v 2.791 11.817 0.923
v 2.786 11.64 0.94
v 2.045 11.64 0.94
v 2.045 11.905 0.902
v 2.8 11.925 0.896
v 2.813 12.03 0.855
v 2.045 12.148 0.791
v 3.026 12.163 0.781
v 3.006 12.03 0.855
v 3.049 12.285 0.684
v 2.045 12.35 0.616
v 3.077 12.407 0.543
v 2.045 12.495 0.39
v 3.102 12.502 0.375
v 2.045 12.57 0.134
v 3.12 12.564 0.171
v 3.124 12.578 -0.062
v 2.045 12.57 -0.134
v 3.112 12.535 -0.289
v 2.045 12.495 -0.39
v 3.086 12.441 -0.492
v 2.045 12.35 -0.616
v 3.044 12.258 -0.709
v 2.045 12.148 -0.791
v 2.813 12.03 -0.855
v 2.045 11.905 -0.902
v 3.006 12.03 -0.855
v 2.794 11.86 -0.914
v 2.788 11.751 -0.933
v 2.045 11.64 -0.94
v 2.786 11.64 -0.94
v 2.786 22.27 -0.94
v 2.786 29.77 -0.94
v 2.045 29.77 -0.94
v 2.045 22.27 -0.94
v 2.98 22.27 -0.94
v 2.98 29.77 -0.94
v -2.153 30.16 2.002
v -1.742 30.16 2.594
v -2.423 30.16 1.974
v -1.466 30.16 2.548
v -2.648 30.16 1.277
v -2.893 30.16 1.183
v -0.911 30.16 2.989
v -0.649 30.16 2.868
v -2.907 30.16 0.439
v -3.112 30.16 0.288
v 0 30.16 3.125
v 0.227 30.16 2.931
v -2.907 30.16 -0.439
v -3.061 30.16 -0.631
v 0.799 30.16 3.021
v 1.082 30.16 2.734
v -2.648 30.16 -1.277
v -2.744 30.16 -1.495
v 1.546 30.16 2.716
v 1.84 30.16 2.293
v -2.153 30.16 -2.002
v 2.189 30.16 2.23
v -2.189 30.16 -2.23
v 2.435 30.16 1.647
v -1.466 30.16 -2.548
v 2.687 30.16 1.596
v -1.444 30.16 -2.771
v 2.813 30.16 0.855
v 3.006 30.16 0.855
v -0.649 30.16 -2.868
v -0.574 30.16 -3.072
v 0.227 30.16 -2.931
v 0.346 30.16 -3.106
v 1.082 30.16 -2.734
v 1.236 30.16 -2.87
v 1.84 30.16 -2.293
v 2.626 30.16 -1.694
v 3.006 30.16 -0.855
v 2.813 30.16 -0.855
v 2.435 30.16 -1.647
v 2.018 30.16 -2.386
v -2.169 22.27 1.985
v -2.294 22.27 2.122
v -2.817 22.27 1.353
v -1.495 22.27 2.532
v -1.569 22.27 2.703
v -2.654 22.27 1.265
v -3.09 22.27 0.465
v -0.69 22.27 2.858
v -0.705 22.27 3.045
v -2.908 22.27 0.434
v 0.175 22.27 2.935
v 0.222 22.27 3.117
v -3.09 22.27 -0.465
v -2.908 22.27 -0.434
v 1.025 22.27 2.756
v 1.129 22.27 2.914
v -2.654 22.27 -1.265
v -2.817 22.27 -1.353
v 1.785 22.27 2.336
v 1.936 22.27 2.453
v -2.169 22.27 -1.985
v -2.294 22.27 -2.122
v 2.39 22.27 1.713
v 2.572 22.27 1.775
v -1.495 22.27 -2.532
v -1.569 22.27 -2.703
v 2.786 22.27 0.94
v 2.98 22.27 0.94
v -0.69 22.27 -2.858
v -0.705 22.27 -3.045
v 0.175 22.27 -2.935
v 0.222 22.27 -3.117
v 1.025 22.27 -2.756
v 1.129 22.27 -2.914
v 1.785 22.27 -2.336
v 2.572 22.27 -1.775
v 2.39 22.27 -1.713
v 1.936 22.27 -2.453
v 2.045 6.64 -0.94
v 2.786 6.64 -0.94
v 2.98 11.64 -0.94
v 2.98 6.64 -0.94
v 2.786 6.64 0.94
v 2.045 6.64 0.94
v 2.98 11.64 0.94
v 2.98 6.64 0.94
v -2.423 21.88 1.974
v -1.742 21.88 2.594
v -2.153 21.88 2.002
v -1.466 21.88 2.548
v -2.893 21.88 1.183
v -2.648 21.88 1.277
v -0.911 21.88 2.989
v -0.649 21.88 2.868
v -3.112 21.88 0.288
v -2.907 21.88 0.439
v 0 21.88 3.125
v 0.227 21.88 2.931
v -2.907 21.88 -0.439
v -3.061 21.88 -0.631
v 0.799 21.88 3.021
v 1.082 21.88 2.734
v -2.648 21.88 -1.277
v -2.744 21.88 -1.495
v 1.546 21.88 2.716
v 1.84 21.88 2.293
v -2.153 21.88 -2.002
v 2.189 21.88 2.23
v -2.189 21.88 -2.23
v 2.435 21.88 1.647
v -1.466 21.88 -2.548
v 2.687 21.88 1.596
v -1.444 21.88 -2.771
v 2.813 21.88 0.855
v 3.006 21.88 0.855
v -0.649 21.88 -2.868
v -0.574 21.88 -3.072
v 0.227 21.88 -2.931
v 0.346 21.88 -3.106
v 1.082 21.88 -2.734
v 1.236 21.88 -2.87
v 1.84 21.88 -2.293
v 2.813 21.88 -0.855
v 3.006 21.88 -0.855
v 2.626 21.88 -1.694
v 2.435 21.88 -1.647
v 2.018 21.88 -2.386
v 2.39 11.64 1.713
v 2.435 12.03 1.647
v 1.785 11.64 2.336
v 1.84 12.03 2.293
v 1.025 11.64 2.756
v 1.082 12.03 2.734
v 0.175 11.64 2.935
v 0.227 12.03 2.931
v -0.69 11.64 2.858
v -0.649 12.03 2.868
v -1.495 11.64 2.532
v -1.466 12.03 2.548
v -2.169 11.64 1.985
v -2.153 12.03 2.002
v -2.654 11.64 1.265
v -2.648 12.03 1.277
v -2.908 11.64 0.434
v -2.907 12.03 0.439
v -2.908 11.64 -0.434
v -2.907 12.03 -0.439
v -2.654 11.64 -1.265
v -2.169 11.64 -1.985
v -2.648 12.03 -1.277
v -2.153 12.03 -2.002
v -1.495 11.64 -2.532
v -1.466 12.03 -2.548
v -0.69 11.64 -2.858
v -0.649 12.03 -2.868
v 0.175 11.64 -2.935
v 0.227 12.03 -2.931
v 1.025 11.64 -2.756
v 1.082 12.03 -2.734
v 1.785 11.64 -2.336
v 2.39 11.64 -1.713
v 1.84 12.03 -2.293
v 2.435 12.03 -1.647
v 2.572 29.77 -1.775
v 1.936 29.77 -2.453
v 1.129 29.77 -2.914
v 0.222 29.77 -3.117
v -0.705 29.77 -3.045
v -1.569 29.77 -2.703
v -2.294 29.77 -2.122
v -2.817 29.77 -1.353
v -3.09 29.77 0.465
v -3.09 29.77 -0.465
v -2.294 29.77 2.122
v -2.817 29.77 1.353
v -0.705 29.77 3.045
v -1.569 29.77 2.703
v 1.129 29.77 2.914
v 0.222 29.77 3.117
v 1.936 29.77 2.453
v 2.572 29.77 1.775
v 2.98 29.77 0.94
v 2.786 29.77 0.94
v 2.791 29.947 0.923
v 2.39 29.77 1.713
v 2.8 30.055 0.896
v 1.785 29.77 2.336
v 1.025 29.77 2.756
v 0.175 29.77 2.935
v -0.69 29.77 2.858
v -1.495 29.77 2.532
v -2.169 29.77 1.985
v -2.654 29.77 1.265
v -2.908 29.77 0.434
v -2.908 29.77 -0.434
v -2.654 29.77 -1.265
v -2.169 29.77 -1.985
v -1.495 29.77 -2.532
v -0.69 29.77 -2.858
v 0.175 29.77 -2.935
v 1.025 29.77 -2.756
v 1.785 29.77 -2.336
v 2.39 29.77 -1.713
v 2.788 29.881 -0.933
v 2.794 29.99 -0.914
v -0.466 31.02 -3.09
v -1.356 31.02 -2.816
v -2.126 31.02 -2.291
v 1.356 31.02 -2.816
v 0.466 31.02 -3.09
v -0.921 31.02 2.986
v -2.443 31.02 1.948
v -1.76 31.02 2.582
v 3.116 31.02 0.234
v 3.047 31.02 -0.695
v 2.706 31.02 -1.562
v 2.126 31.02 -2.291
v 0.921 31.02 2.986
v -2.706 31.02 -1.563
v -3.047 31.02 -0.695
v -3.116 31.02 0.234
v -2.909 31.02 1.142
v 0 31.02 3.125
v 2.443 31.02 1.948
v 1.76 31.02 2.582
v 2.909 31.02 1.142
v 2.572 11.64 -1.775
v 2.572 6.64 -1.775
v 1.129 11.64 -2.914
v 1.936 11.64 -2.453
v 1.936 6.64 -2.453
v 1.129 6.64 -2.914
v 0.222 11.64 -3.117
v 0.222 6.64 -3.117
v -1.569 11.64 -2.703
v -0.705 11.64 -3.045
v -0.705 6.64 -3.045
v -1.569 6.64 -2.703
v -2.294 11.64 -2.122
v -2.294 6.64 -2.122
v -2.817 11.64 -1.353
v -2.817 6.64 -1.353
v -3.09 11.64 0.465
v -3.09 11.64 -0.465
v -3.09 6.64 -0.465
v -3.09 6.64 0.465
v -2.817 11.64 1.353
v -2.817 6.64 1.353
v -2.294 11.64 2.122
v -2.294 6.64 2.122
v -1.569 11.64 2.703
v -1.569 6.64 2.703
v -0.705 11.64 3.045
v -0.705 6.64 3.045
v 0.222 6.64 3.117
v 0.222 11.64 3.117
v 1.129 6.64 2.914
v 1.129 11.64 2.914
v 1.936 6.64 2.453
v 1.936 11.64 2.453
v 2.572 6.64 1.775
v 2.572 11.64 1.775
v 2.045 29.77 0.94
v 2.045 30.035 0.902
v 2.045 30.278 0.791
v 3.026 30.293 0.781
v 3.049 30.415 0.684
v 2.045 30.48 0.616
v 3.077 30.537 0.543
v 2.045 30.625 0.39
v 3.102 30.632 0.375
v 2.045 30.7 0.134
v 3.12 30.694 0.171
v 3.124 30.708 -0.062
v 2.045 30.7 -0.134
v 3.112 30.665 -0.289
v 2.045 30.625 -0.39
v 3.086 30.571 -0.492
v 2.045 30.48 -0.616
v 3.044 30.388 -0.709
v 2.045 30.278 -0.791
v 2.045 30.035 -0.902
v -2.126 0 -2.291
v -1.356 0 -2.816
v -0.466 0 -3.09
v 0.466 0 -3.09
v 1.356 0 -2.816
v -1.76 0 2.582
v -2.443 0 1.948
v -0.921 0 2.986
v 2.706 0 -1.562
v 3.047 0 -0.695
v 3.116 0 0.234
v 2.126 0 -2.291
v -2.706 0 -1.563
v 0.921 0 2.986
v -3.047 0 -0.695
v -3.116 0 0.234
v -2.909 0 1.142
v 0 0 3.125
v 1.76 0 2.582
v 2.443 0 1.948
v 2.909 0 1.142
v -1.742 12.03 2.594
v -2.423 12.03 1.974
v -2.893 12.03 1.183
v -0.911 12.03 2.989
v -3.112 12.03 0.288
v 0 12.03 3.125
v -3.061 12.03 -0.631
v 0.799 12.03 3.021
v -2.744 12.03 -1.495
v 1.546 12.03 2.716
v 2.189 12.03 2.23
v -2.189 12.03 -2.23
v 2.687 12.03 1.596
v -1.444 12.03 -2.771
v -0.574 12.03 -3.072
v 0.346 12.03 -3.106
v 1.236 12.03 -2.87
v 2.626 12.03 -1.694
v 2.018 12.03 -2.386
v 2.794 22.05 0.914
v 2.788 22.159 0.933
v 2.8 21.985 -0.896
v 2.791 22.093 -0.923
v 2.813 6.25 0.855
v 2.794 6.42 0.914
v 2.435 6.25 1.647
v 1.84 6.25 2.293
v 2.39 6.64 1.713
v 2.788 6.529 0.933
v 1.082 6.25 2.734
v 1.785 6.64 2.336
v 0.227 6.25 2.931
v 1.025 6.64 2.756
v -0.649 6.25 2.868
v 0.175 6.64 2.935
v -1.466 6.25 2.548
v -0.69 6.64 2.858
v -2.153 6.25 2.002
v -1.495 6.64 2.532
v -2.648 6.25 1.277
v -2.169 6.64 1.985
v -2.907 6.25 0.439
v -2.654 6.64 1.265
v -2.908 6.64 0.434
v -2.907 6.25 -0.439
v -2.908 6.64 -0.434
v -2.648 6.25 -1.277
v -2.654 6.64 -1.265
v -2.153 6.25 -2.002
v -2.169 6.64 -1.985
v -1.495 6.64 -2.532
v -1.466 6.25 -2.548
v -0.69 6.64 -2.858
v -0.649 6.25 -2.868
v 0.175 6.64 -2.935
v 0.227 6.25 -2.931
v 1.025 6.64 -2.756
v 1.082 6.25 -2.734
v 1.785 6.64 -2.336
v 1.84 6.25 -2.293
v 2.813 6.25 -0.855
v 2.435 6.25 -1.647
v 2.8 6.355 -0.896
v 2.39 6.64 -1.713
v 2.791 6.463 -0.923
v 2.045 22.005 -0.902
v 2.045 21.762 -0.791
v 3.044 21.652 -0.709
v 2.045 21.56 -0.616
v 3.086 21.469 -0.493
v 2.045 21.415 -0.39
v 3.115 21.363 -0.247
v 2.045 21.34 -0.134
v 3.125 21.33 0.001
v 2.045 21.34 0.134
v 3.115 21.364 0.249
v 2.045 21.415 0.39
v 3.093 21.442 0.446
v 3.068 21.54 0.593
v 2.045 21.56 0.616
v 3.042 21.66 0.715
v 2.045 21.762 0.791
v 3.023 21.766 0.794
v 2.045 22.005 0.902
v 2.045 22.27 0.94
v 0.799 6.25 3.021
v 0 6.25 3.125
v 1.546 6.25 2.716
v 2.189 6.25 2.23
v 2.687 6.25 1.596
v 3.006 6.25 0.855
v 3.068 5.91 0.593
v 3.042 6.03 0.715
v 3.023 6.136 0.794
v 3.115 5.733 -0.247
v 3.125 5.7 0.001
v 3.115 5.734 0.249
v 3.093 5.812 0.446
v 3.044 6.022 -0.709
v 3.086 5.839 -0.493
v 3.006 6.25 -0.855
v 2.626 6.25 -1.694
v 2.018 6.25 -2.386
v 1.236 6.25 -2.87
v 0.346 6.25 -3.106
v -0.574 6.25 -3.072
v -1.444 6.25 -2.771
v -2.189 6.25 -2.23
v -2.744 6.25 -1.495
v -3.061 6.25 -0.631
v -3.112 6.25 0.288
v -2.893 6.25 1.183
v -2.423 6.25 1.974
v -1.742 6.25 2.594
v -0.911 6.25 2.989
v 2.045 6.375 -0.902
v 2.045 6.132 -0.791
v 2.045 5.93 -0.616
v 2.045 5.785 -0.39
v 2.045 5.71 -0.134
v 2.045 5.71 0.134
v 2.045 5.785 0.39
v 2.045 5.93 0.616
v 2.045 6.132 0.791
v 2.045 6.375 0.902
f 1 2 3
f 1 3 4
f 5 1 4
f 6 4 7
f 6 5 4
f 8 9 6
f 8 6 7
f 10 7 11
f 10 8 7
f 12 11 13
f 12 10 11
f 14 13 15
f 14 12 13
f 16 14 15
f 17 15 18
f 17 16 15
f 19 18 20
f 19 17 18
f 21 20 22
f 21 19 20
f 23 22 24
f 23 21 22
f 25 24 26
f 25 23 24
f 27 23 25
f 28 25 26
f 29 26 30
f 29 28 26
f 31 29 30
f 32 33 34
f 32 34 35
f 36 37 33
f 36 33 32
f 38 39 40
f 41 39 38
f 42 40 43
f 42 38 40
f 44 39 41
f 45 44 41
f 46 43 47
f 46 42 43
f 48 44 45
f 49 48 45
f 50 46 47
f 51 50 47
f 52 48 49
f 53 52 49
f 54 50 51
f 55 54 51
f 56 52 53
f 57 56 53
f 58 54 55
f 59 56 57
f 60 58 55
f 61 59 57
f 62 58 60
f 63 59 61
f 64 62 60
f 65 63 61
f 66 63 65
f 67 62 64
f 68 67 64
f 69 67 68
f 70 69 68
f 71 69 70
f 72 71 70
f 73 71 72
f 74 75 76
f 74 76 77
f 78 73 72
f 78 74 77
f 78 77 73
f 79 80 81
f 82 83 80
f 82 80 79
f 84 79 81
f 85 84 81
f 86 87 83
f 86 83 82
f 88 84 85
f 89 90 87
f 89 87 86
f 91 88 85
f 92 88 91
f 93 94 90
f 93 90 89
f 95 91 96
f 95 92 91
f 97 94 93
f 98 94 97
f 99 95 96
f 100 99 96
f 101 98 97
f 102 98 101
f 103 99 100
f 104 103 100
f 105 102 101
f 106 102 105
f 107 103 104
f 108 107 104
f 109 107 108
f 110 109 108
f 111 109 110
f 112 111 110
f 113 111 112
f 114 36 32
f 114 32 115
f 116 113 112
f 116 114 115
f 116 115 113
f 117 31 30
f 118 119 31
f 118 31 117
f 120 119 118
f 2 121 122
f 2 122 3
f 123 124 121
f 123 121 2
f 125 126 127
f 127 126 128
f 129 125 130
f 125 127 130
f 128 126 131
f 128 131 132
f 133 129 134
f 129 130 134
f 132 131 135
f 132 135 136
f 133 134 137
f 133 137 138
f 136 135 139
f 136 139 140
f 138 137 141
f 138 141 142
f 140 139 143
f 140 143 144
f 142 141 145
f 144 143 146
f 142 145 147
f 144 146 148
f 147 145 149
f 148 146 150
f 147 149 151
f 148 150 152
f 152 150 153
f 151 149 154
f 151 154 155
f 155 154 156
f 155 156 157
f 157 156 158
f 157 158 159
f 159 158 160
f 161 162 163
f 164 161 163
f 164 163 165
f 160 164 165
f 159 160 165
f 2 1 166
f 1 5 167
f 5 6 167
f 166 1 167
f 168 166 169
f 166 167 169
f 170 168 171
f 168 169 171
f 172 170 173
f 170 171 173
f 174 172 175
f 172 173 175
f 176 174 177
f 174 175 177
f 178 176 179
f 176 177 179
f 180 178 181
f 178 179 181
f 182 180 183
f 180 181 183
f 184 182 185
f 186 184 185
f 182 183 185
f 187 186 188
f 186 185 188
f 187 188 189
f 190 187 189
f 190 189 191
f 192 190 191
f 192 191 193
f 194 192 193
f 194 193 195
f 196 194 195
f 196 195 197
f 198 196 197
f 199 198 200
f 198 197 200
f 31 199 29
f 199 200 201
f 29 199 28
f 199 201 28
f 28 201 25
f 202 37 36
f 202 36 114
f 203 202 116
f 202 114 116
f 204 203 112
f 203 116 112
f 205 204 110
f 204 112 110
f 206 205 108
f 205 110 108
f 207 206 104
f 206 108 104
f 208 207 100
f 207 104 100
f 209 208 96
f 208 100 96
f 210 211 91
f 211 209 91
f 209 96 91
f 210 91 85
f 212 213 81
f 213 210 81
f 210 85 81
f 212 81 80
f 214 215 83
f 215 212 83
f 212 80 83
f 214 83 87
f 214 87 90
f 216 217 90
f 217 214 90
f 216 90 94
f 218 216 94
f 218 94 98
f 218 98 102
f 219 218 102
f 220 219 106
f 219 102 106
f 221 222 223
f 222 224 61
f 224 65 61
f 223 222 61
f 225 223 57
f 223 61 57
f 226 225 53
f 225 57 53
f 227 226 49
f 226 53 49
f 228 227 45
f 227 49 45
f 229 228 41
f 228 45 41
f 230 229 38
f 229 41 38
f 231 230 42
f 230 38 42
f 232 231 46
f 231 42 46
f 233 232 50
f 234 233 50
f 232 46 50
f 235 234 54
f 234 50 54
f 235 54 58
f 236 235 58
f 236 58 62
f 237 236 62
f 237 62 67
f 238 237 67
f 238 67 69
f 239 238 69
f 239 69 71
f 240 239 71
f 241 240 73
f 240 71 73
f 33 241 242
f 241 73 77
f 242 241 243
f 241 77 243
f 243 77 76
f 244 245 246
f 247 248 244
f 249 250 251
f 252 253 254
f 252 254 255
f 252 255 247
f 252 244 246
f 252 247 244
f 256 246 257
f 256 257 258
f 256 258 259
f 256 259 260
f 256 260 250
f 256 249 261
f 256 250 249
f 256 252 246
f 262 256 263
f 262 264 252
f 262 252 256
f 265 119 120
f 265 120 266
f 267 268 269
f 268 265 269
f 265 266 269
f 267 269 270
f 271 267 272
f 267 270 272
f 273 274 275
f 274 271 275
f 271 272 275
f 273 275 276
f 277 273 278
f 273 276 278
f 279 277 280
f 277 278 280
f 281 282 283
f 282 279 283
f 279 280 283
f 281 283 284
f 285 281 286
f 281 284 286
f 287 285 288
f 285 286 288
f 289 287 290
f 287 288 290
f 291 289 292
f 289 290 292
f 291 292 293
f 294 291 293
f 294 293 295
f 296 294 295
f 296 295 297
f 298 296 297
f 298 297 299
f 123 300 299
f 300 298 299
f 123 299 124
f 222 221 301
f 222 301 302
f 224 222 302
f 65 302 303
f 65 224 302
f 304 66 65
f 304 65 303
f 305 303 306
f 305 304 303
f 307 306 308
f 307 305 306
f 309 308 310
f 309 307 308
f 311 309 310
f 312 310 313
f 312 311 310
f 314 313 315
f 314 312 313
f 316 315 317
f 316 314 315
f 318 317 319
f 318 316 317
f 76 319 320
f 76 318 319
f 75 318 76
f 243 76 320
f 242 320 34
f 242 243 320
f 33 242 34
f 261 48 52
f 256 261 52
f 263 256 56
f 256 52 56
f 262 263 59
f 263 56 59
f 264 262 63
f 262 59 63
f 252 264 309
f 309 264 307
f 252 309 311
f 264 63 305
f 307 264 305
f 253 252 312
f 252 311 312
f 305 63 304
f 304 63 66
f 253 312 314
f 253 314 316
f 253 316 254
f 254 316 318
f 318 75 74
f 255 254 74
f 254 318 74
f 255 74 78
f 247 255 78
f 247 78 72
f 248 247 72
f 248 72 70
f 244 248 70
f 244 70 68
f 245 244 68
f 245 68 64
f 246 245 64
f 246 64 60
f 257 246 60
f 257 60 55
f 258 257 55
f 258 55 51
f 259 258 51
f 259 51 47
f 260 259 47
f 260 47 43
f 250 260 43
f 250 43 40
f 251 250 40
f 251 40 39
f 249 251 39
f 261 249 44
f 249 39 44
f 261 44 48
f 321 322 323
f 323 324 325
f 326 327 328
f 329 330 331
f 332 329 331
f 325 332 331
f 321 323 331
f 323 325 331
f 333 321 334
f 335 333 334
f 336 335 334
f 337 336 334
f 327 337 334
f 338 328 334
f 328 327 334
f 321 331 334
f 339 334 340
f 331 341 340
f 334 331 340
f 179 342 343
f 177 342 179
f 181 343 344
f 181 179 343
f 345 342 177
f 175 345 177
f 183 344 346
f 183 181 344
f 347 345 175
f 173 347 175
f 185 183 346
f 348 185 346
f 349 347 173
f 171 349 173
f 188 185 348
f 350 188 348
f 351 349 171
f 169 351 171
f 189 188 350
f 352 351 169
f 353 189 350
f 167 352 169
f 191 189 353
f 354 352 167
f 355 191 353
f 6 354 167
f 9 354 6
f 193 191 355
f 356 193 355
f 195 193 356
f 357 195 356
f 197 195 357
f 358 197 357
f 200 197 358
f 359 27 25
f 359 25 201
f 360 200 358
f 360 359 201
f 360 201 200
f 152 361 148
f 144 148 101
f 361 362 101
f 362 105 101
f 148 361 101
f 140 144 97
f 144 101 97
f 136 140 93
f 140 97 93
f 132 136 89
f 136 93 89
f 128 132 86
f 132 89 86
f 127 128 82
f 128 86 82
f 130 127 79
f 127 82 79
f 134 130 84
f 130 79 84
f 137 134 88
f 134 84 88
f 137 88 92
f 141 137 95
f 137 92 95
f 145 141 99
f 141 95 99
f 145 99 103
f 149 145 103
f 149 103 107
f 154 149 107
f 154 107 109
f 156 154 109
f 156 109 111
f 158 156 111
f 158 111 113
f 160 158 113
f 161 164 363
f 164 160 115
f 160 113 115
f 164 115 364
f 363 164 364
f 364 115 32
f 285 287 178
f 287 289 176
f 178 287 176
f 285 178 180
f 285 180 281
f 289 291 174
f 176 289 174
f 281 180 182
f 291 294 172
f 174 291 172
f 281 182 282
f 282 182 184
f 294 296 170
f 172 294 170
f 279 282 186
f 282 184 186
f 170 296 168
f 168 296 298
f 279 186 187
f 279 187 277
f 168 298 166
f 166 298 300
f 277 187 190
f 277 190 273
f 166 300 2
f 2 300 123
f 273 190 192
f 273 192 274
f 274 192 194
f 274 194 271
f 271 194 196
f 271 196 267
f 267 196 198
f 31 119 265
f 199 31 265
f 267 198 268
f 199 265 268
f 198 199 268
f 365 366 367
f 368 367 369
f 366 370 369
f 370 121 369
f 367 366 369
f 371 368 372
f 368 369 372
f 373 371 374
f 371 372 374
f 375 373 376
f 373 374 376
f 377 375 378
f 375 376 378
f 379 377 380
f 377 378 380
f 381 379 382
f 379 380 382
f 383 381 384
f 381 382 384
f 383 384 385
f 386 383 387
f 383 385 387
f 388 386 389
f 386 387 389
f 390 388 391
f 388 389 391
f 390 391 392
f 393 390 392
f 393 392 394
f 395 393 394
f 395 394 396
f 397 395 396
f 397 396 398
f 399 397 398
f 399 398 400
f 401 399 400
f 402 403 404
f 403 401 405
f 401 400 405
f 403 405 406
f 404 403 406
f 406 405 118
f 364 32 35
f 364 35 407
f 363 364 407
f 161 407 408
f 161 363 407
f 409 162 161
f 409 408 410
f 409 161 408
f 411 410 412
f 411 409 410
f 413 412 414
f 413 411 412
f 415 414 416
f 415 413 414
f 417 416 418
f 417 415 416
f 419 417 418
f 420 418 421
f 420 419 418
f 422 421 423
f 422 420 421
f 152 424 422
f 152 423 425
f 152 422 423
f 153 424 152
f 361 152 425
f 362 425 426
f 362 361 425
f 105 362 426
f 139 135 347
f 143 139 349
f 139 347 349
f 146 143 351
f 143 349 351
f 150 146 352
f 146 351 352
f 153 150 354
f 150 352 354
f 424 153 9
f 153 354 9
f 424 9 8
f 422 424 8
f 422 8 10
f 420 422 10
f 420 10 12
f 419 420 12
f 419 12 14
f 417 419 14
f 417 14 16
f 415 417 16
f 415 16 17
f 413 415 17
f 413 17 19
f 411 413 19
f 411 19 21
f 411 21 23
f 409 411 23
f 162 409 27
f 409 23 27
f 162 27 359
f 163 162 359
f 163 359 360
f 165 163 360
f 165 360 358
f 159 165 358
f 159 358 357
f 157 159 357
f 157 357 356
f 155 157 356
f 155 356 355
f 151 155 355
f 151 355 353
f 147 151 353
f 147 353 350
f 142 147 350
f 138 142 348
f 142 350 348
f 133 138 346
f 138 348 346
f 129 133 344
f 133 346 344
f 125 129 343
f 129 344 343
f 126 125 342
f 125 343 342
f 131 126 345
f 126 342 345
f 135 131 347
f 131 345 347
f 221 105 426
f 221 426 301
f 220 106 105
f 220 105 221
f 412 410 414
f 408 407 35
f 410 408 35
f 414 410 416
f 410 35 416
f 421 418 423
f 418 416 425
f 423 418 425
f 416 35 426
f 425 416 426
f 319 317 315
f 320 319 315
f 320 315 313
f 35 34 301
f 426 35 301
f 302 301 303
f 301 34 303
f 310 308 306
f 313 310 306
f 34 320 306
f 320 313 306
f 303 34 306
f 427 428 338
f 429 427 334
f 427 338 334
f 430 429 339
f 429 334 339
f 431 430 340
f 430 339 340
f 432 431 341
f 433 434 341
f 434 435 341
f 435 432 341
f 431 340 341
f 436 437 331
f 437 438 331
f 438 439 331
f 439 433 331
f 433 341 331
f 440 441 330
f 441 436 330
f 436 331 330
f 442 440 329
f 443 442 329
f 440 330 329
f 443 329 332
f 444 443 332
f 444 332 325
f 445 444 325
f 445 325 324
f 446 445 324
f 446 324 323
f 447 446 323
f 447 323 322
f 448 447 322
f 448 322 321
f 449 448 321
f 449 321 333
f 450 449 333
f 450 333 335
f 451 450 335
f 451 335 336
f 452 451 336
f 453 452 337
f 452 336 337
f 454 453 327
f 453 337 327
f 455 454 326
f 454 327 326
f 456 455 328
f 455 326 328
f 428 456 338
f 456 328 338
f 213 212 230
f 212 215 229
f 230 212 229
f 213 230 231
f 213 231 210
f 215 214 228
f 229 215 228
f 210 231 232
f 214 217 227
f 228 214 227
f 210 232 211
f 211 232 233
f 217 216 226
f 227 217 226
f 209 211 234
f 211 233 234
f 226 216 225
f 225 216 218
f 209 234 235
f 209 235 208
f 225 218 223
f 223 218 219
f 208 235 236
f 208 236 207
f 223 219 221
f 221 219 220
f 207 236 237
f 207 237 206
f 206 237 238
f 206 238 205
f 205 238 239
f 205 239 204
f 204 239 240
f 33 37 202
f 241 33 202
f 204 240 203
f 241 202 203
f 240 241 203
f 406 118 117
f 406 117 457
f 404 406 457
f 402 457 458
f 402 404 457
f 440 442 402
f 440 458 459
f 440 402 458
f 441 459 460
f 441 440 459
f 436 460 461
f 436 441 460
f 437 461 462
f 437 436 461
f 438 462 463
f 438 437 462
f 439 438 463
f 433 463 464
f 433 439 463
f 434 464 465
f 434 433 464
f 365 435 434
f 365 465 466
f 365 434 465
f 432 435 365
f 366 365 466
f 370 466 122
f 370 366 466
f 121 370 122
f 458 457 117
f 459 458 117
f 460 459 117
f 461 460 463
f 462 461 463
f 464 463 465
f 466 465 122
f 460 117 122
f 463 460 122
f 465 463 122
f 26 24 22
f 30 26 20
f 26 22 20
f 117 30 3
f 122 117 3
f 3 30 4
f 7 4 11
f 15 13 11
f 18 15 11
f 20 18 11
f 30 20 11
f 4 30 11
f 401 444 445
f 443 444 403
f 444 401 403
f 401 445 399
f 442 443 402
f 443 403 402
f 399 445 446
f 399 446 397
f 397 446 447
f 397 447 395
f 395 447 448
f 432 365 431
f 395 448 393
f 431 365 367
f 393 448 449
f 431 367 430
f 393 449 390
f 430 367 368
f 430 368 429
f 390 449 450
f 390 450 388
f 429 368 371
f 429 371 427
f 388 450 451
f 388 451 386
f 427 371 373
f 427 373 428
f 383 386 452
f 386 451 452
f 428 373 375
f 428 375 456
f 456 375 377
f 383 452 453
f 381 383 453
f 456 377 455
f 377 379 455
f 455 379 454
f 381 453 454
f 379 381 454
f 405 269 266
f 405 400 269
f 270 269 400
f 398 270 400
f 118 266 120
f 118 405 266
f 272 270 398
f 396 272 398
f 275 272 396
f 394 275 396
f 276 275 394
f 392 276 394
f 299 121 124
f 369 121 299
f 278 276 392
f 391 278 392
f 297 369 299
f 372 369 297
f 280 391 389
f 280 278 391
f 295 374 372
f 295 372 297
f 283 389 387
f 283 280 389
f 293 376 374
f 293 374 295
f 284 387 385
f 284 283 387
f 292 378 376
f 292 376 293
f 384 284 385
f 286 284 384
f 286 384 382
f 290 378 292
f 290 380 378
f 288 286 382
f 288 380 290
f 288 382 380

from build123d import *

# Parameters (mm, degrees)
SKETCH1_R           = 3.125
BOSS_EXTRUDE1_DEPTH = 31.02
SKETCH2_W           = 3.905114493
SKETCH2_H           = 0.39
SKETCH3_W           = 3.758921356
SKETCH3_H           = 0.39
SKETCH4_W           = 9.324870886
SKETCH4_H           = 0.39
SKETCH5_W           = 5.319059986
SKETCH5_H           = 0.39
CUT_EXTRUDE1_DEPTH  = 1.08
CUT_EXTRUDE2_DEPTH  = 1.08


with BuildPart() as part:
    # Sketch1 → Boss-Extrude1 (new body)
    with BuildSketch(Plane(origin=(0, 0, 0), x_dir=(1, 0, 0), z_dir=(0, 1, 0))):
        with Locations(Location((0, 0, 0), (0, 0, 270))):
            Circle(SKETCH1_R)
    extrude(amount=BOSS_EXTRUDE1_DEPTH)

    # Sketch2 → Cut-Revolve1 (revolve, cut)
    with BuildSketch(Plane(origin=(0, 0, 0), x_dir=(0, 0, -1), z_dir=(1, 0, 0))):
        with Locations((-4.892557247, 6.445)):
            Rectangle(SKETCH2_W, SKETCH2_H)
    revolve(axis=Axis((0, 10.072914163, 0), (0, -1, 0)), mode=Mode.SUBTRACT)

    # Sketch3 → Cut-Revolve2 (revolve, cut)
    with BuildSketch(Plane(origin=(0, 0, 0), x_dir=(0, 0, -1), z_dir=(1, 0, 0)), mode=Mode.PRIVATE) as cut_revolve2_sk:
        with Locations((-4.819460678, 11.835)):
            Rectangle(SKETCH3_W, SKETCH3_H)
    revolve(cut_revolve2_sk.sketch.rotate(Axis((0, 13.686668931, 0), (0, -1, 0)), 180), axis=Axis((0, 13.686668931, 0), (0, -1, 0)), mode=Mode.SUBTRACT)

    # Sketch4 → Cut-Revolve3 (revolve, cut)
    with BuildSketch(Plane(origin=(0, 0, 0), x_dir=(0, 0, -1), z_dir=(1, 0, 0)), mode=Mode.PRIVATE) as cut_revolve3_sk:
        with Locations((-7.602435443, 22.075)):
            Rectangle(SKETCH4_W, SKETCH4_H)
    revolve(cut_revolve3_sk.sketch.rotate(Axis((0, 25.014989783, 0), (0, -1, 0)), 180), axis=Axis((0, 25.014989783, 0), (0, -1, 0)), mode=Mode.SUBTRACT)

    # Sketch5 → Cut-Revolve4 (revolve, cut)
    with BuildSketch(Plane(origin=(0, 0, 0), x_dir=(0, 0, -1), z_dir=(1, 0, 0)), mode=Mode.PRIVATE) as cut_revolve4_sk:
        with Locations((-5.599529993, 29.965)):
            Rectangle(SKETCH5_W, SKETCH5_H)
    revolve(cut_revolve4_sk.sketch.rotate(Axis((0, 30.713823838, 0), (0, -1, 0)), 180), axis=Axis((0, 30.713823838, 0), (0, -1, 0)), mode=Mode.SUBTRACT)

    # Sketch6 → Cut-Extrude1 (cut)
    with BuildSketch(Plane(origin=(3.125, 0, 0), x_dir=(0, 0, -1), z_dir=(1, 0, 0))):
        with BuildLine():
            Line((0.94, 29.77), (0.94, 22.27))
            ThreePointArc((0.94, 22.27), (0, 21.33), (-0.94, 22.27))
            Line((-0.94, 22.27), (-0.94, 29.77))
            ThreePointArc((-0.94, 29.77), (0, 30.71), (0.94, 29.77))
        make_face()
    extrude(amount=-CUT_EXTRUDE1_DEPTH, mode=Mode.SUBTRACT)

    # Sketch7 → Cut-Extrude2 (cut)
    with BuildSketch(Plane(origin=(3.125, 0, 0), x_dir=(0, 0, -1), z_dir=(1, 0, 0))):
        with BuildLine():
            Line((0.94, 11.64), (0.94, 6.64))
            ThreePointArc((0.94, 6.64), (0, 5.7), (-0.94, 6.64))
            Line((-0.94, 6.64), (-0.94, 11.64))
            ThreePointArc((-0.94, 11.64), (0, 12.58), (0.94, 11.64))
        make_face()
    extrude(amount=-CUT_EXTRUDE2_DEPTH, mode=Mode.SUBTRACT)


solid = part.part
